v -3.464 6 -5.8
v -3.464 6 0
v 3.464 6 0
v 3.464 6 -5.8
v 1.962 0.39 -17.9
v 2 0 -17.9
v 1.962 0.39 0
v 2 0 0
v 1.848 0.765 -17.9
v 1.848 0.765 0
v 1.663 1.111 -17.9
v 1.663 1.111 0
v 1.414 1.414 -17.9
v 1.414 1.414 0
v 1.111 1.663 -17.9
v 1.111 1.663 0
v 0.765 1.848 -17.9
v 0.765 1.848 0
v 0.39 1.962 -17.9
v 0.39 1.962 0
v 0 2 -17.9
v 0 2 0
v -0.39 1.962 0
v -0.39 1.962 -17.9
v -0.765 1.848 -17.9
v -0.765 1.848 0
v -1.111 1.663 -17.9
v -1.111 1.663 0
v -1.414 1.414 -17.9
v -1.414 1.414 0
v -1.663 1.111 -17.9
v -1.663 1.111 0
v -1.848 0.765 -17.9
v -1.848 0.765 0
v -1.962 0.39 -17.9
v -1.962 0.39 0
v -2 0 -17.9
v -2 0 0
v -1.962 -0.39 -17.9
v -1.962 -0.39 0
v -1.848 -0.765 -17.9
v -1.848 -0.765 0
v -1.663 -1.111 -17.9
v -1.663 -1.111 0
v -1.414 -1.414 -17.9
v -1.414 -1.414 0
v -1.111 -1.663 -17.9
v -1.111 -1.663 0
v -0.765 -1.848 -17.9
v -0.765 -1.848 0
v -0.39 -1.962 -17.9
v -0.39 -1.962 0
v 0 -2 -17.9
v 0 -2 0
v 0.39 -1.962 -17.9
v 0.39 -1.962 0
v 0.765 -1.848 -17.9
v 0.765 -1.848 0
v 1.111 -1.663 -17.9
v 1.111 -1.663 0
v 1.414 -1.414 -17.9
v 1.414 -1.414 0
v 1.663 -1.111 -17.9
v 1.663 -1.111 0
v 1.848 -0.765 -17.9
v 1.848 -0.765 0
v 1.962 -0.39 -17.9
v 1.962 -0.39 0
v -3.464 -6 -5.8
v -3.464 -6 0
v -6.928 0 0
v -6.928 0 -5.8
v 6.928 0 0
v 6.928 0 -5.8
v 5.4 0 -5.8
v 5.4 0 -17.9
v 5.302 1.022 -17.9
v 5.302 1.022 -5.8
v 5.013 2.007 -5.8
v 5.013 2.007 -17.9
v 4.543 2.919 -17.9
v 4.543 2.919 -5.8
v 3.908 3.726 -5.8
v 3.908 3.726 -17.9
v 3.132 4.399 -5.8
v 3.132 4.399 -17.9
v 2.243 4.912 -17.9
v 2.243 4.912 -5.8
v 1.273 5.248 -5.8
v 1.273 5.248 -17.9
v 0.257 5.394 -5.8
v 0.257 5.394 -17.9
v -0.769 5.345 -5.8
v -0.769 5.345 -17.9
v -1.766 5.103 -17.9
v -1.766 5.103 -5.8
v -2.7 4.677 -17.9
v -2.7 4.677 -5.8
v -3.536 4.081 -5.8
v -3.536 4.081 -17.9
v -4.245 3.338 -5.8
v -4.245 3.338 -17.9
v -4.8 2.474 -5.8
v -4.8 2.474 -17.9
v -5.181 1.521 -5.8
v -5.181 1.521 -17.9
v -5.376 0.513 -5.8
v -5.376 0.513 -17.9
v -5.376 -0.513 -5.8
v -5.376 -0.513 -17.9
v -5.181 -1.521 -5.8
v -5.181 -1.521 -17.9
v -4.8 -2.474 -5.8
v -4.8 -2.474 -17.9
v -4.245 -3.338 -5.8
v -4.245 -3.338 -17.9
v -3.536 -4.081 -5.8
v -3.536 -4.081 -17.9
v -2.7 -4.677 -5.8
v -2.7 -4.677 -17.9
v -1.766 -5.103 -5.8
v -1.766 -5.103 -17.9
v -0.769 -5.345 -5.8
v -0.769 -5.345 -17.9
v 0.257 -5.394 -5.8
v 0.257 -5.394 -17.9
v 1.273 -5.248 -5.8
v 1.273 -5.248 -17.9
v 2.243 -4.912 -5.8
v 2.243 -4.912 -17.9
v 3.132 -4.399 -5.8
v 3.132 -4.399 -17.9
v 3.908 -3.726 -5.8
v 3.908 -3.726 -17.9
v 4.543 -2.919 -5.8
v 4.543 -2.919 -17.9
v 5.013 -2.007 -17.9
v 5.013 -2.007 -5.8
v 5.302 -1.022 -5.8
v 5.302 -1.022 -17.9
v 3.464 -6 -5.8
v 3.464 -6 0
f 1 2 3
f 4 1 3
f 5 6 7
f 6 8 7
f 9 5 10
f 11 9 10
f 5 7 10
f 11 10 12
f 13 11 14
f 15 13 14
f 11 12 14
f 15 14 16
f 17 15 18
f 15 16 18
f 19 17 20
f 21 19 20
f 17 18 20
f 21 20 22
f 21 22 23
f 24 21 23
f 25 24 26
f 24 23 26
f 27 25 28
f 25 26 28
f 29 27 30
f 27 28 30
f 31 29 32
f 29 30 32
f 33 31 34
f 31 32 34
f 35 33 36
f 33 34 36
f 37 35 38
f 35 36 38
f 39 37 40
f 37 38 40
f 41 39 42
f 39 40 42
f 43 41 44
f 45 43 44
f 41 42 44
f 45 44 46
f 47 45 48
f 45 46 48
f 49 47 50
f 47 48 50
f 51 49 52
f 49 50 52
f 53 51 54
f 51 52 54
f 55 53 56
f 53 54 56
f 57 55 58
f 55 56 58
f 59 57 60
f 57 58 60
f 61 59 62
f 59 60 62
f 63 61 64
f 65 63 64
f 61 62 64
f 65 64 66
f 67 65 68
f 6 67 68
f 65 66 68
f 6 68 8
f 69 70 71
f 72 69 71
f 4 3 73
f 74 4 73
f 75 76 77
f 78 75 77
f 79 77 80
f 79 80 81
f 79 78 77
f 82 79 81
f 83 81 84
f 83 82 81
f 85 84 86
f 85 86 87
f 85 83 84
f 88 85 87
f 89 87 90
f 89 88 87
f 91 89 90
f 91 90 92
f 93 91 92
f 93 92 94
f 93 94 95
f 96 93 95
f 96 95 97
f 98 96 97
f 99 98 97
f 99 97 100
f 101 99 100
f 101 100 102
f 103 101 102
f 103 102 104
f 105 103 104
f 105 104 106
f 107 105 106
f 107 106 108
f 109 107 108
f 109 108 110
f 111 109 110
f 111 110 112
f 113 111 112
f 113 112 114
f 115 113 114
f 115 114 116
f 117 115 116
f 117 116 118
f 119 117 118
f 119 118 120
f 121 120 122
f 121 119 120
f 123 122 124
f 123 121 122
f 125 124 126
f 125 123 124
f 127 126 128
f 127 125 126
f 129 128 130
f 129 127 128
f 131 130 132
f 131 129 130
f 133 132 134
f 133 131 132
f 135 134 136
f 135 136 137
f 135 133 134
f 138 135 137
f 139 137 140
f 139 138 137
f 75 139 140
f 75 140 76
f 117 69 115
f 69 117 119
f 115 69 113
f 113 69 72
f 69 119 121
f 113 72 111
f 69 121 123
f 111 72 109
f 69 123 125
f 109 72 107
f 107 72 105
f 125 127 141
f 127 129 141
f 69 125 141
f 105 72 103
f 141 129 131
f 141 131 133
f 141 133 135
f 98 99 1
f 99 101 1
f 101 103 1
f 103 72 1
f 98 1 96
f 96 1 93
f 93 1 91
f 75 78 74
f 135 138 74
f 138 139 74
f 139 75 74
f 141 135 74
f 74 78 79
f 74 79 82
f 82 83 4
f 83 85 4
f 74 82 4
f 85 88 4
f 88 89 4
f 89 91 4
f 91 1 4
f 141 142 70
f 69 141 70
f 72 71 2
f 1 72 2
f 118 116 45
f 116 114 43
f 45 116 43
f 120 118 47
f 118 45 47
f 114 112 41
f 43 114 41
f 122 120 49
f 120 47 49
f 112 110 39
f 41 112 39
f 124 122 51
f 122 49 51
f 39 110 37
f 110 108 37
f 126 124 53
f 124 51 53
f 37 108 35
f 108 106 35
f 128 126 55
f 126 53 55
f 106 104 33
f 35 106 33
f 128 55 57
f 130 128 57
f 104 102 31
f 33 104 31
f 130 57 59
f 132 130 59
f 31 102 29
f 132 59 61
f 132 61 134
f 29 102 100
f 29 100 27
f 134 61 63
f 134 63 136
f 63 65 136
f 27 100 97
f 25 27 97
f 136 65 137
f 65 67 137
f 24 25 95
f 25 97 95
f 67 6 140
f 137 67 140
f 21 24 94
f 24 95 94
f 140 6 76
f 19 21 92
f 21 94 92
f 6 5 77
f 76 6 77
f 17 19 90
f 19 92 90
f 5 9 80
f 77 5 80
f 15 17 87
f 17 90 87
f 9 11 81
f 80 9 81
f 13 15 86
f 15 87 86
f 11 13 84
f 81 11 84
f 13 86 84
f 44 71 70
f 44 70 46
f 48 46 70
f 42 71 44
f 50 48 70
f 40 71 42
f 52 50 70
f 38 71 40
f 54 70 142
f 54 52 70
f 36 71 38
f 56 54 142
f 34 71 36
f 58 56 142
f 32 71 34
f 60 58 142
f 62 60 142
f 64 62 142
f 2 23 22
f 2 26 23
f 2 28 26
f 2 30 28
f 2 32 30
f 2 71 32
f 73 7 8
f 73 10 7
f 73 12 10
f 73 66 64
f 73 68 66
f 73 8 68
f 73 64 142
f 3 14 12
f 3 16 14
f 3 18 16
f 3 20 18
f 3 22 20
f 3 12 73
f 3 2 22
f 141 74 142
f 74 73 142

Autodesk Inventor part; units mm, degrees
ref_plane "YZ Plane" through (0, 0, 0) normal (1, 0, 0) x (0, 1, 0)
ref_plane "XZ Plane" through (0, 0, 0) normal (0, 1, 0) x (-1, 0, 0)
ref_plane "XY Plane" through (0, 0, 0) normal (0, 0, 1) x (1, 0, 0)
sketch "Sketch1" plane through (0, 0, 0) normal (0, 0, 1) x (1, 0, 0)
  circle A0 centre (0, 0) radius 5.4
  dimension "d0" = 10.8
extrude "Extrusion1" add sketch "Sketch1" against normal blind 17.9
sketch "Sketch2" plane through (0, 0, 0) normal (0, 0, 1) x (1, 0, 0)
  line L0 (3.4641, 6) -> (6.9282, 0)
  line L1 (6.9282, 0) -> (3.4641, -6)
  line L2 (3.4641, -6) -> (-3.4641, -6)
  line L3 (-3.4641, -6) -> (-6.9282, 0)
  line L4 (-6.9282, 0) -> (-3.4641, 6)
  line L5 (-3.4641, 6) -> (3.4641, 6)
  point P0 (0, 0)
  point P1 (0, 0)
  dimension "d4" = 12
extrude "Extrusion2" add sketch "Sketch2" against normal blind 5.8
sketch "Sketch3" plane through (0, 0, 0) normal (0, 0, 1) x (1, 0, 0)
  circle A0 centre (0, 0) radius 2
  dimension "d7" = 4
extrude "Extrusion3" cut sketch "Sketch3" against normal through all
properties part number "pin motor"
